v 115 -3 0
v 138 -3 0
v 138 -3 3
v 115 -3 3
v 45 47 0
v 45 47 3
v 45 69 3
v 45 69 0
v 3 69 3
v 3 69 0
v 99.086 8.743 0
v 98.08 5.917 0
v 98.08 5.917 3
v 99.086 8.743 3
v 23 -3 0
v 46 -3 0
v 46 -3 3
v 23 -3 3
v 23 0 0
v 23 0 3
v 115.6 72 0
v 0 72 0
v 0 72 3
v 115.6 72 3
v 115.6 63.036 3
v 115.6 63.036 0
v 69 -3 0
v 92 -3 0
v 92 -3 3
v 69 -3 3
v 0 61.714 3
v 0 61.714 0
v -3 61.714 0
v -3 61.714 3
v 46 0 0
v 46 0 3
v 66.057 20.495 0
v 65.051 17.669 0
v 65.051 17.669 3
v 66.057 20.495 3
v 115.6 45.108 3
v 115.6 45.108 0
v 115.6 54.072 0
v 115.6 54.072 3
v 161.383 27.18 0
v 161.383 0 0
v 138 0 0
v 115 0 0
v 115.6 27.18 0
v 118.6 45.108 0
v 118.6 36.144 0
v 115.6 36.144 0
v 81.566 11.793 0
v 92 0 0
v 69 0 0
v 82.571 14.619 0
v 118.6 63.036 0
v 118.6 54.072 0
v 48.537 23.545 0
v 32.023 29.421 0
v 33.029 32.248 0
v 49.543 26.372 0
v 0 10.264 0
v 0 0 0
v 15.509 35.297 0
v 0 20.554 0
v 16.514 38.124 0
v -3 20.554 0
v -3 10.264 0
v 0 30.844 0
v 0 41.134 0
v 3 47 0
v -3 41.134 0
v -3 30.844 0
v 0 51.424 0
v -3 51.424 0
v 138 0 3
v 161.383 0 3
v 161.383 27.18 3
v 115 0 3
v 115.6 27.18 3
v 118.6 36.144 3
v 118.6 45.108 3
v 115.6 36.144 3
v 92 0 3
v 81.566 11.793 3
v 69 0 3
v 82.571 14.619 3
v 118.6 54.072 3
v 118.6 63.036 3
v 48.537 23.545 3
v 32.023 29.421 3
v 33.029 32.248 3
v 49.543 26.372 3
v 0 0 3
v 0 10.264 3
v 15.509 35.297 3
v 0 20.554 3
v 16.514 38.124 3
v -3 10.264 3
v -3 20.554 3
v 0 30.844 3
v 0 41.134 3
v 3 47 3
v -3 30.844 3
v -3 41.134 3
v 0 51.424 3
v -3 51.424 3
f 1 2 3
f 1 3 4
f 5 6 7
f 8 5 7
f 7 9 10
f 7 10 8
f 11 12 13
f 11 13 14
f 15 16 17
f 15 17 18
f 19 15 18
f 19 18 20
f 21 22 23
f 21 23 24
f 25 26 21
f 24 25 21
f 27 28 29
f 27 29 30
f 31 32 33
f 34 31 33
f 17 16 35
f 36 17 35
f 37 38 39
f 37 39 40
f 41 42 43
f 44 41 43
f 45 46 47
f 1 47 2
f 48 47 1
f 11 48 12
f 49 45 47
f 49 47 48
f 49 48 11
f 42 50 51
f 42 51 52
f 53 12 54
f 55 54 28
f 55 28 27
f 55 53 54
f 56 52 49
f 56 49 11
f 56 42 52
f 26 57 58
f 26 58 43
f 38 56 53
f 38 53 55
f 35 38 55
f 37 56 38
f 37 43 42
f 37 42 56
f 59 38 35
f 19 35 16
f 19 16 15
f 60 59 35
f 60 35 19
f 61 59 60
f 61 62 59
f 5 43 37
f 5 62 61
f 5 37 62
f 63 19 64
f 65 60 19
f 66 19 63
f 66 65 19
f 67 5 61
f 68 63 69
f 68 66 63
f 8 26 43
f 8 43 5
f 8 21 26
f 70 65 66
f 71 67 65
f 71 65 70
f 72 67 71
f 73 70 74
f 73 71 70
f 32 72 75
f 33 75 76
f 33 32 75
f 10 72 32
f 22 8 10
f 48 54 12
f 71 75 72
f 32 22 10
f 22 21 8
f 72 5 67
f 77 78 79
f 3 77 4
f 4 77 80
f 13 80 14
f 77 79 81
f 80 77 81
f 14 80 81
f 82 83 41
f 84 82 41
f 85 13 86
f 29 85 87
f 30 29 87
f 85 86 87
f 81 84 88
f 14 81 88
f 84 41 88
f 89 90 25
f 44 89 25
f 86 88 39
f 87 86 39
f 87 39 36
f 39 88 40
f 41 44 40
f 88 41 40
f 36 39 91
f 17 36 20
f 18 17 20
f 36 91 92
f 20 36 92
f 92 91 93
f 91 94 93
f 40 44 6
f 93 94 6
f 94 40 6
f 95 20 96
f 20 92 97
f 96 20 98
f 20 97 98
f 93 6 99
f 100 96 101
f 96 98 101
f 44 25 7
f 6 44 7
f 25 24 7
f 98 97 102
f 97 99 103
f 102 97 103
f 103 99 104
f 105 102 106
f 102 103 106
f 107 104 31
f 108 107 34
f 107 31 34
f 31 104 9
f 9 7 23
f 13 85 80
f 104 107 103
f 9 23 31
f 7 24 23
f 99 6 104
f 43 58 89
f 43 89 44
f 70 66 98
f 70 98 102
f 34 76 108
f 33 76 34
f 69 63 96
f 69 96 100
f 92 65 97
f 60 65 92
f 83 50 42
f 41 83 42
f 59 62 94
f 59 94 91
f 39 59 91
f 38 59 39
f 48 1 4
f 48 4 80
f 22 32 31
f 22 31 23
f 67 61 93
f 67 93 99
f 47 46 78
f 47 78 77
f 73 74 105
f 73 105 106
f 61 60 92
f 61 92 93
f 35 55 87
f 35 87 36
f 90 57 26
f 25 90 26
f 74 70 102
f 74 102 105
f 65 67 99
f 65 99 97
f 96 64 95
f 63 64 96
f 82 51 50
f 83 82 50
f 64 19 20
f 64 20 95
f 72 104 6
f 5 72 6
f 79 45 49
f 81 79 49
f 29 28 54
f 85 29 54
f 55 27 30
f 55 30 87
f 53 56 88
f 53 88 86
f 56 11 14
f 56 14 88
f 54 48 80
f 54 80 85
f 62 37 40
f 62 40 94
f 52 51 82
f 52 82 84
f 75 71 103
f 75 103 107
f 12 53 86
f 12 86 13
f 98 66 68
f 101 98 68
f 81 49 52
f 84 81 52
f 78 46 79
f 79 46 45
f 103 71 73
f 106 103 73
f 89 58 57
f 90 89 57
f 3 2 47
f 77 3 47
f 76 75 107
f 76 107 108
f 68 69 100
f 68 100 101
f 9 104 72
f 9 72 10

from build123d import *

# Parameters (mm, degrees)
SKETCH1_W           = 115.6
SKETCH1_H           = 72
BOSS_EXTRUDE1_DEPTH = 3
CUT_EXTRUDE1_REACH  = 5
SKETCH2_W           = 42
SKETCH2_H           = 22
SKETCH3_W           = 3
SKETCH3_H           = 10.29
SKETCH3_H_2         = 8.964
BOSS_EXTRUDE2_DEPTH = 3
SKETCH6_W           = 45.782864491
SKETCH6_H           = 27.18
BOSS_EXTRUDE4_DEPTH = 3
SKETCH8_W           = 23
SKETCH8_H           = 3
BOSS_EXTRUDE5_DEPTH = 3


with BuildPart() as part:
    # Sketch1 → Boss-Extrude1 (new body)
    with BuildSketch(Plane.XY):
        with Locations((57.8, 36)):
            Rectangle(SKETCH1_W, SKETCH1_H)
        Polygon((16.514285714, 38.123846184), (15.508587017, 35.297440316), (32.022872733, 29.421286499), (33.02857143, 32.247692367), align=None, mode=Mode.SUBTRACT)
        Polygon((49.542857146, 26.37153855), (48.537158448, 23.545132682), (65.051444164, 17.668978865), (66.057142861, 20.495384733), align=None, mode=Mode.SUBTRACT)
        Polygon((82.571428577, 14.619230916), (81.56572988, 11.792825048), (98.080015595, 5.916671232), (99.085714292, 8.743077099), align=None, mode=Mode.SUBTRACT)
    extrude(amount=BOSS_EXTRUDE1_DEPTH)

    # Sketch2 → Cut-Extrude1 (cut, up to next)
    with BuildSketch(Plane.XY.offset(3), mode=Mode.PRIVATE) as cut_extrude1_sk1:
        with Locations((24, 58)):
            Rectangle(SKETCH2_W, SKETCH2_H)
    cut_extrude1_tool1 = extrude(cut_extrude1_sk1.sketch, amount=-CUT_EXTRUDE1_REACH, mode=Mode.PRIVATE) & part.part
    add(cut_extrude1_tool1.solids().sort_by_distance((24, 58, 3))[0], mode=Mode.SUBTRACT)

    # Sketch3 → Boss-Extrude2 (add)
    with BuildSketch(Plane(origin=(0, 0, 0), x_dir=(-1, 0, 0), z_dir=(0, 0, -1))):
        with Locations((1.5, 56.569285714)):
            Rectangle(SKETCH3_W, SKETCH3_H)
        with Locations((1.5, 35.989285714)):
            Rectangle(SKETCH3_W, SKETCH3_H)
        with Locations((1.5, 15.409285714)):
            Rectangle(SKETCH3_W, SKETCH3_H)
        with Locations((-117.1, 58.554)):
            Rectangle(SKETCH3_W, SKETCH3_H_2)
        with Locations((-117.1, 40.626)):
            Rectangle(SKETCH3_W, SKETCH3_H_2)
    extrude(amount=-BOSS_EXTRUDE2_DEPTH)

    # Sketch6 → Boss-Extrude4 (add)
    with BuildSketch(Plane(origin=(0, 0, 0), x_dir=(-1, 0, 0), z_dir=(0, 0, -1))):
        with Locations((-138.491432246, 13.59)):
            Rectangle(SKETCH6_W, SKETCH6_H)
    extrude(amount=-BOSS_EXTRUDE4_DEPTH)

    # Sketch8 → Boss-Extrude5 (add)
    with BuildSketch(Plane(origin=(0, 0, 0), x_dir=(-1, 0, 0), z_dir=(0, 0, -1))):
        with Locations((-34.5, -1.5)):
            Rectangle(SKETCH8_W, SKETCH8_H)
        with Locations((-80.5, -1.5)):
            Rectangle(SKETCH8_W, SKETCH8_H)
        with Locations((-126.5, -1.5)):
            Rectangle(SKETCH8_W, SKETCH8_H)
    extrude(amount=-BOSS_EXTRUDE5_DEPTH)


solid = part.part
